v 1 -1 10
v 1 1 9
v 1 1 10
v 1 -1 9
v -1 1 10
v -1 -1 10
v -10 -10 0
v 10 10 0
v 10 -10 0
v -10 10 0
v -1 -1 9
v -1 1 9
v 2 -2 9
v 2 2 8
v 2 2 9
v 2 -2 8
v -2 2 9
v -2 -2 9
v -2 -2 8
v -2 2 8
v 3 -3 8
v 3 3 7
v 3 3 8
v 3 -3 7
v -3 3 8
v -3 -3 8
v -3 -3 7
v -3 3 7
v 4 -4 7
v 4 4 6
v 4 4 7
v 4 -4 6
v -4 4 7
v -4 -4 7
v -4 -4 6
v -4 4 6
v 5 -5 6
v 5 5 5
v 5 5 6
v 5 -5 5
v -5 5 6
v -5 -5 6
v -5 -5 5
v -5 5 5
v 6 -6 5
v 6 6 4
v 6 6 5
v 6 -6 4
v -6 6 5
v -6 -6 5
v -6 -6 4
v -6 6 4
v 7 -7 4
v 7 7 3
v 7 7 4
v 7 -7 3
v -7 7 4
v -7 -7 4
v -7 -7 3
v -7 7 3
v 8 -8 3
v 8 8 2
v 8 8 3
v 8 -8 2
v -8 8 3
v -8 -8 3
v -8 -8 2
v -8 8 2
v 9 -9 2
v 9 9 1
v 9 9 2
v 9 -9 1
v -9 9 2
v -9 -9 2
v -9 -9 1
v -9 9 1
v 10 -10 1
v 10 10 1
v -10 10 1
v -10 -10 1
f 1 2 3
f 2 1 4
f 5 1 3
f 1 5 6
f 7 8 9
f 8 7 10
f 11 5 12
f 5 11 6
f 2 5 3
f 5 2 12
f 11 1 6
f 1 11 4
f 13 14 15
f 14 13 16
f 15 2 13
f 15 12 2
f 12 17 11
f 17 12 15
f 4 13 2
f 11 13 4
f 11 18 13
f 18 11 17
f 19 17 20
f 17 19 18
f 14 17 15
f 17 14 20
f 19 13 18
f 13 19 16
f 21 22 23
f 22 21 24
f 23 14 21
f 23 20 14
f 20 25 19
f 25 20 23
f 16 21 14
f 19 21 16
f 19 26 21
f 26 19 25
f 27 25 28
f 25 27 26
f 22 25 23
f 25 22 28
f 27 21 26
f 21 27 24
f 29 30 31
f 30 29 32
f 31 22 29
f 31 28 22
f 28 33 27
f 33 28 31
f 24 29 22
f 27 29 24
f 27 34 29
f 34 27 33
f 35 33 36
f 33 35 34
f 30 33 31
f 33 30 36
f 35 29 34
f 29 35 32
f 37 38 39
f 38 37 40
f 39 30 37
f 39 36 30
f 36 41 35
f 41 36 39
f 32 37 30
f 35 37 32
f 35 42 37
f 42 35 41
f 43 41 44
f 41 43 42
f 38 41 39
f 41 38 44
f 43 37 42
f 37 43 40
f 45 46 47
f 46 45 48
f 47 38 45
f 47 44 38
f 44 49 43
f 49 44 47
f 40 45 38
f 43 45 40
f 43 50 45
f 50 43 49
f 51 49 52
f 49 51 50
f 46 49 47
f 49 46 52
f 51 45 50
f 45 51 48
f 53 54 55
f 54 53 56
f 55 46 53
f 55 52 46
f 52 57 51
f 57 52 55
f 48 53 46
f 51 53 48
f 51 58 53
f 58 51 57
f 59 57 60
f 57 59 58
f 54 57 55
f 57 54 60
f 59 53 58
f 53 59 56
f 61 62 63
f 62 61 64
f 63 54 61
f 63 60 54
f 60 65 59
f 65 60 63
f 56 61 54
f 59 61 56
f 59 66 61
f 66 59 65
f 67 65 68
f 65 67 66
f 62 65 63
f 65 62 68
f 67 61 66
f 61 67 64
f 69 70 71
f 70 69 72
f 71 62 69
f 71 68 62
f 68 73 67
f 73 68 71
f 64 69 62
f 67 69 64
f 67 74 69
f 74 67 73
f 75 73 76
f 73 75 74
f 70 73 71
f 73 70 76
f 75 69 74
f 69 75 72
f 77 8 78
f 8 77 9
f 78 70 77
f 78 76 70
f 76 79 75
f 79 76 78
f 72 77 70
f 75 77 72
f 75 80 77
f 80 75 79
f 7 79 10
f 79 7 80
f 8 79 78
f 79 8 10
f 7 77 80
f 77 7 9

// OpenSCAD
// Simple stepped tower test

steps=10;
step_th=1.0;
step_dl=2.0;
top_l=2.0;

for(i=[0:steps-1]) assign(dl=i*step_dl+top_l,dh=(steps-i)*step_th) {
 echo(str("step: ",i," dl=",dl," dh=",dh));
 translate([-dl/2,-dl/2,0]) cube([dl,dl,dh],center=false);
}
